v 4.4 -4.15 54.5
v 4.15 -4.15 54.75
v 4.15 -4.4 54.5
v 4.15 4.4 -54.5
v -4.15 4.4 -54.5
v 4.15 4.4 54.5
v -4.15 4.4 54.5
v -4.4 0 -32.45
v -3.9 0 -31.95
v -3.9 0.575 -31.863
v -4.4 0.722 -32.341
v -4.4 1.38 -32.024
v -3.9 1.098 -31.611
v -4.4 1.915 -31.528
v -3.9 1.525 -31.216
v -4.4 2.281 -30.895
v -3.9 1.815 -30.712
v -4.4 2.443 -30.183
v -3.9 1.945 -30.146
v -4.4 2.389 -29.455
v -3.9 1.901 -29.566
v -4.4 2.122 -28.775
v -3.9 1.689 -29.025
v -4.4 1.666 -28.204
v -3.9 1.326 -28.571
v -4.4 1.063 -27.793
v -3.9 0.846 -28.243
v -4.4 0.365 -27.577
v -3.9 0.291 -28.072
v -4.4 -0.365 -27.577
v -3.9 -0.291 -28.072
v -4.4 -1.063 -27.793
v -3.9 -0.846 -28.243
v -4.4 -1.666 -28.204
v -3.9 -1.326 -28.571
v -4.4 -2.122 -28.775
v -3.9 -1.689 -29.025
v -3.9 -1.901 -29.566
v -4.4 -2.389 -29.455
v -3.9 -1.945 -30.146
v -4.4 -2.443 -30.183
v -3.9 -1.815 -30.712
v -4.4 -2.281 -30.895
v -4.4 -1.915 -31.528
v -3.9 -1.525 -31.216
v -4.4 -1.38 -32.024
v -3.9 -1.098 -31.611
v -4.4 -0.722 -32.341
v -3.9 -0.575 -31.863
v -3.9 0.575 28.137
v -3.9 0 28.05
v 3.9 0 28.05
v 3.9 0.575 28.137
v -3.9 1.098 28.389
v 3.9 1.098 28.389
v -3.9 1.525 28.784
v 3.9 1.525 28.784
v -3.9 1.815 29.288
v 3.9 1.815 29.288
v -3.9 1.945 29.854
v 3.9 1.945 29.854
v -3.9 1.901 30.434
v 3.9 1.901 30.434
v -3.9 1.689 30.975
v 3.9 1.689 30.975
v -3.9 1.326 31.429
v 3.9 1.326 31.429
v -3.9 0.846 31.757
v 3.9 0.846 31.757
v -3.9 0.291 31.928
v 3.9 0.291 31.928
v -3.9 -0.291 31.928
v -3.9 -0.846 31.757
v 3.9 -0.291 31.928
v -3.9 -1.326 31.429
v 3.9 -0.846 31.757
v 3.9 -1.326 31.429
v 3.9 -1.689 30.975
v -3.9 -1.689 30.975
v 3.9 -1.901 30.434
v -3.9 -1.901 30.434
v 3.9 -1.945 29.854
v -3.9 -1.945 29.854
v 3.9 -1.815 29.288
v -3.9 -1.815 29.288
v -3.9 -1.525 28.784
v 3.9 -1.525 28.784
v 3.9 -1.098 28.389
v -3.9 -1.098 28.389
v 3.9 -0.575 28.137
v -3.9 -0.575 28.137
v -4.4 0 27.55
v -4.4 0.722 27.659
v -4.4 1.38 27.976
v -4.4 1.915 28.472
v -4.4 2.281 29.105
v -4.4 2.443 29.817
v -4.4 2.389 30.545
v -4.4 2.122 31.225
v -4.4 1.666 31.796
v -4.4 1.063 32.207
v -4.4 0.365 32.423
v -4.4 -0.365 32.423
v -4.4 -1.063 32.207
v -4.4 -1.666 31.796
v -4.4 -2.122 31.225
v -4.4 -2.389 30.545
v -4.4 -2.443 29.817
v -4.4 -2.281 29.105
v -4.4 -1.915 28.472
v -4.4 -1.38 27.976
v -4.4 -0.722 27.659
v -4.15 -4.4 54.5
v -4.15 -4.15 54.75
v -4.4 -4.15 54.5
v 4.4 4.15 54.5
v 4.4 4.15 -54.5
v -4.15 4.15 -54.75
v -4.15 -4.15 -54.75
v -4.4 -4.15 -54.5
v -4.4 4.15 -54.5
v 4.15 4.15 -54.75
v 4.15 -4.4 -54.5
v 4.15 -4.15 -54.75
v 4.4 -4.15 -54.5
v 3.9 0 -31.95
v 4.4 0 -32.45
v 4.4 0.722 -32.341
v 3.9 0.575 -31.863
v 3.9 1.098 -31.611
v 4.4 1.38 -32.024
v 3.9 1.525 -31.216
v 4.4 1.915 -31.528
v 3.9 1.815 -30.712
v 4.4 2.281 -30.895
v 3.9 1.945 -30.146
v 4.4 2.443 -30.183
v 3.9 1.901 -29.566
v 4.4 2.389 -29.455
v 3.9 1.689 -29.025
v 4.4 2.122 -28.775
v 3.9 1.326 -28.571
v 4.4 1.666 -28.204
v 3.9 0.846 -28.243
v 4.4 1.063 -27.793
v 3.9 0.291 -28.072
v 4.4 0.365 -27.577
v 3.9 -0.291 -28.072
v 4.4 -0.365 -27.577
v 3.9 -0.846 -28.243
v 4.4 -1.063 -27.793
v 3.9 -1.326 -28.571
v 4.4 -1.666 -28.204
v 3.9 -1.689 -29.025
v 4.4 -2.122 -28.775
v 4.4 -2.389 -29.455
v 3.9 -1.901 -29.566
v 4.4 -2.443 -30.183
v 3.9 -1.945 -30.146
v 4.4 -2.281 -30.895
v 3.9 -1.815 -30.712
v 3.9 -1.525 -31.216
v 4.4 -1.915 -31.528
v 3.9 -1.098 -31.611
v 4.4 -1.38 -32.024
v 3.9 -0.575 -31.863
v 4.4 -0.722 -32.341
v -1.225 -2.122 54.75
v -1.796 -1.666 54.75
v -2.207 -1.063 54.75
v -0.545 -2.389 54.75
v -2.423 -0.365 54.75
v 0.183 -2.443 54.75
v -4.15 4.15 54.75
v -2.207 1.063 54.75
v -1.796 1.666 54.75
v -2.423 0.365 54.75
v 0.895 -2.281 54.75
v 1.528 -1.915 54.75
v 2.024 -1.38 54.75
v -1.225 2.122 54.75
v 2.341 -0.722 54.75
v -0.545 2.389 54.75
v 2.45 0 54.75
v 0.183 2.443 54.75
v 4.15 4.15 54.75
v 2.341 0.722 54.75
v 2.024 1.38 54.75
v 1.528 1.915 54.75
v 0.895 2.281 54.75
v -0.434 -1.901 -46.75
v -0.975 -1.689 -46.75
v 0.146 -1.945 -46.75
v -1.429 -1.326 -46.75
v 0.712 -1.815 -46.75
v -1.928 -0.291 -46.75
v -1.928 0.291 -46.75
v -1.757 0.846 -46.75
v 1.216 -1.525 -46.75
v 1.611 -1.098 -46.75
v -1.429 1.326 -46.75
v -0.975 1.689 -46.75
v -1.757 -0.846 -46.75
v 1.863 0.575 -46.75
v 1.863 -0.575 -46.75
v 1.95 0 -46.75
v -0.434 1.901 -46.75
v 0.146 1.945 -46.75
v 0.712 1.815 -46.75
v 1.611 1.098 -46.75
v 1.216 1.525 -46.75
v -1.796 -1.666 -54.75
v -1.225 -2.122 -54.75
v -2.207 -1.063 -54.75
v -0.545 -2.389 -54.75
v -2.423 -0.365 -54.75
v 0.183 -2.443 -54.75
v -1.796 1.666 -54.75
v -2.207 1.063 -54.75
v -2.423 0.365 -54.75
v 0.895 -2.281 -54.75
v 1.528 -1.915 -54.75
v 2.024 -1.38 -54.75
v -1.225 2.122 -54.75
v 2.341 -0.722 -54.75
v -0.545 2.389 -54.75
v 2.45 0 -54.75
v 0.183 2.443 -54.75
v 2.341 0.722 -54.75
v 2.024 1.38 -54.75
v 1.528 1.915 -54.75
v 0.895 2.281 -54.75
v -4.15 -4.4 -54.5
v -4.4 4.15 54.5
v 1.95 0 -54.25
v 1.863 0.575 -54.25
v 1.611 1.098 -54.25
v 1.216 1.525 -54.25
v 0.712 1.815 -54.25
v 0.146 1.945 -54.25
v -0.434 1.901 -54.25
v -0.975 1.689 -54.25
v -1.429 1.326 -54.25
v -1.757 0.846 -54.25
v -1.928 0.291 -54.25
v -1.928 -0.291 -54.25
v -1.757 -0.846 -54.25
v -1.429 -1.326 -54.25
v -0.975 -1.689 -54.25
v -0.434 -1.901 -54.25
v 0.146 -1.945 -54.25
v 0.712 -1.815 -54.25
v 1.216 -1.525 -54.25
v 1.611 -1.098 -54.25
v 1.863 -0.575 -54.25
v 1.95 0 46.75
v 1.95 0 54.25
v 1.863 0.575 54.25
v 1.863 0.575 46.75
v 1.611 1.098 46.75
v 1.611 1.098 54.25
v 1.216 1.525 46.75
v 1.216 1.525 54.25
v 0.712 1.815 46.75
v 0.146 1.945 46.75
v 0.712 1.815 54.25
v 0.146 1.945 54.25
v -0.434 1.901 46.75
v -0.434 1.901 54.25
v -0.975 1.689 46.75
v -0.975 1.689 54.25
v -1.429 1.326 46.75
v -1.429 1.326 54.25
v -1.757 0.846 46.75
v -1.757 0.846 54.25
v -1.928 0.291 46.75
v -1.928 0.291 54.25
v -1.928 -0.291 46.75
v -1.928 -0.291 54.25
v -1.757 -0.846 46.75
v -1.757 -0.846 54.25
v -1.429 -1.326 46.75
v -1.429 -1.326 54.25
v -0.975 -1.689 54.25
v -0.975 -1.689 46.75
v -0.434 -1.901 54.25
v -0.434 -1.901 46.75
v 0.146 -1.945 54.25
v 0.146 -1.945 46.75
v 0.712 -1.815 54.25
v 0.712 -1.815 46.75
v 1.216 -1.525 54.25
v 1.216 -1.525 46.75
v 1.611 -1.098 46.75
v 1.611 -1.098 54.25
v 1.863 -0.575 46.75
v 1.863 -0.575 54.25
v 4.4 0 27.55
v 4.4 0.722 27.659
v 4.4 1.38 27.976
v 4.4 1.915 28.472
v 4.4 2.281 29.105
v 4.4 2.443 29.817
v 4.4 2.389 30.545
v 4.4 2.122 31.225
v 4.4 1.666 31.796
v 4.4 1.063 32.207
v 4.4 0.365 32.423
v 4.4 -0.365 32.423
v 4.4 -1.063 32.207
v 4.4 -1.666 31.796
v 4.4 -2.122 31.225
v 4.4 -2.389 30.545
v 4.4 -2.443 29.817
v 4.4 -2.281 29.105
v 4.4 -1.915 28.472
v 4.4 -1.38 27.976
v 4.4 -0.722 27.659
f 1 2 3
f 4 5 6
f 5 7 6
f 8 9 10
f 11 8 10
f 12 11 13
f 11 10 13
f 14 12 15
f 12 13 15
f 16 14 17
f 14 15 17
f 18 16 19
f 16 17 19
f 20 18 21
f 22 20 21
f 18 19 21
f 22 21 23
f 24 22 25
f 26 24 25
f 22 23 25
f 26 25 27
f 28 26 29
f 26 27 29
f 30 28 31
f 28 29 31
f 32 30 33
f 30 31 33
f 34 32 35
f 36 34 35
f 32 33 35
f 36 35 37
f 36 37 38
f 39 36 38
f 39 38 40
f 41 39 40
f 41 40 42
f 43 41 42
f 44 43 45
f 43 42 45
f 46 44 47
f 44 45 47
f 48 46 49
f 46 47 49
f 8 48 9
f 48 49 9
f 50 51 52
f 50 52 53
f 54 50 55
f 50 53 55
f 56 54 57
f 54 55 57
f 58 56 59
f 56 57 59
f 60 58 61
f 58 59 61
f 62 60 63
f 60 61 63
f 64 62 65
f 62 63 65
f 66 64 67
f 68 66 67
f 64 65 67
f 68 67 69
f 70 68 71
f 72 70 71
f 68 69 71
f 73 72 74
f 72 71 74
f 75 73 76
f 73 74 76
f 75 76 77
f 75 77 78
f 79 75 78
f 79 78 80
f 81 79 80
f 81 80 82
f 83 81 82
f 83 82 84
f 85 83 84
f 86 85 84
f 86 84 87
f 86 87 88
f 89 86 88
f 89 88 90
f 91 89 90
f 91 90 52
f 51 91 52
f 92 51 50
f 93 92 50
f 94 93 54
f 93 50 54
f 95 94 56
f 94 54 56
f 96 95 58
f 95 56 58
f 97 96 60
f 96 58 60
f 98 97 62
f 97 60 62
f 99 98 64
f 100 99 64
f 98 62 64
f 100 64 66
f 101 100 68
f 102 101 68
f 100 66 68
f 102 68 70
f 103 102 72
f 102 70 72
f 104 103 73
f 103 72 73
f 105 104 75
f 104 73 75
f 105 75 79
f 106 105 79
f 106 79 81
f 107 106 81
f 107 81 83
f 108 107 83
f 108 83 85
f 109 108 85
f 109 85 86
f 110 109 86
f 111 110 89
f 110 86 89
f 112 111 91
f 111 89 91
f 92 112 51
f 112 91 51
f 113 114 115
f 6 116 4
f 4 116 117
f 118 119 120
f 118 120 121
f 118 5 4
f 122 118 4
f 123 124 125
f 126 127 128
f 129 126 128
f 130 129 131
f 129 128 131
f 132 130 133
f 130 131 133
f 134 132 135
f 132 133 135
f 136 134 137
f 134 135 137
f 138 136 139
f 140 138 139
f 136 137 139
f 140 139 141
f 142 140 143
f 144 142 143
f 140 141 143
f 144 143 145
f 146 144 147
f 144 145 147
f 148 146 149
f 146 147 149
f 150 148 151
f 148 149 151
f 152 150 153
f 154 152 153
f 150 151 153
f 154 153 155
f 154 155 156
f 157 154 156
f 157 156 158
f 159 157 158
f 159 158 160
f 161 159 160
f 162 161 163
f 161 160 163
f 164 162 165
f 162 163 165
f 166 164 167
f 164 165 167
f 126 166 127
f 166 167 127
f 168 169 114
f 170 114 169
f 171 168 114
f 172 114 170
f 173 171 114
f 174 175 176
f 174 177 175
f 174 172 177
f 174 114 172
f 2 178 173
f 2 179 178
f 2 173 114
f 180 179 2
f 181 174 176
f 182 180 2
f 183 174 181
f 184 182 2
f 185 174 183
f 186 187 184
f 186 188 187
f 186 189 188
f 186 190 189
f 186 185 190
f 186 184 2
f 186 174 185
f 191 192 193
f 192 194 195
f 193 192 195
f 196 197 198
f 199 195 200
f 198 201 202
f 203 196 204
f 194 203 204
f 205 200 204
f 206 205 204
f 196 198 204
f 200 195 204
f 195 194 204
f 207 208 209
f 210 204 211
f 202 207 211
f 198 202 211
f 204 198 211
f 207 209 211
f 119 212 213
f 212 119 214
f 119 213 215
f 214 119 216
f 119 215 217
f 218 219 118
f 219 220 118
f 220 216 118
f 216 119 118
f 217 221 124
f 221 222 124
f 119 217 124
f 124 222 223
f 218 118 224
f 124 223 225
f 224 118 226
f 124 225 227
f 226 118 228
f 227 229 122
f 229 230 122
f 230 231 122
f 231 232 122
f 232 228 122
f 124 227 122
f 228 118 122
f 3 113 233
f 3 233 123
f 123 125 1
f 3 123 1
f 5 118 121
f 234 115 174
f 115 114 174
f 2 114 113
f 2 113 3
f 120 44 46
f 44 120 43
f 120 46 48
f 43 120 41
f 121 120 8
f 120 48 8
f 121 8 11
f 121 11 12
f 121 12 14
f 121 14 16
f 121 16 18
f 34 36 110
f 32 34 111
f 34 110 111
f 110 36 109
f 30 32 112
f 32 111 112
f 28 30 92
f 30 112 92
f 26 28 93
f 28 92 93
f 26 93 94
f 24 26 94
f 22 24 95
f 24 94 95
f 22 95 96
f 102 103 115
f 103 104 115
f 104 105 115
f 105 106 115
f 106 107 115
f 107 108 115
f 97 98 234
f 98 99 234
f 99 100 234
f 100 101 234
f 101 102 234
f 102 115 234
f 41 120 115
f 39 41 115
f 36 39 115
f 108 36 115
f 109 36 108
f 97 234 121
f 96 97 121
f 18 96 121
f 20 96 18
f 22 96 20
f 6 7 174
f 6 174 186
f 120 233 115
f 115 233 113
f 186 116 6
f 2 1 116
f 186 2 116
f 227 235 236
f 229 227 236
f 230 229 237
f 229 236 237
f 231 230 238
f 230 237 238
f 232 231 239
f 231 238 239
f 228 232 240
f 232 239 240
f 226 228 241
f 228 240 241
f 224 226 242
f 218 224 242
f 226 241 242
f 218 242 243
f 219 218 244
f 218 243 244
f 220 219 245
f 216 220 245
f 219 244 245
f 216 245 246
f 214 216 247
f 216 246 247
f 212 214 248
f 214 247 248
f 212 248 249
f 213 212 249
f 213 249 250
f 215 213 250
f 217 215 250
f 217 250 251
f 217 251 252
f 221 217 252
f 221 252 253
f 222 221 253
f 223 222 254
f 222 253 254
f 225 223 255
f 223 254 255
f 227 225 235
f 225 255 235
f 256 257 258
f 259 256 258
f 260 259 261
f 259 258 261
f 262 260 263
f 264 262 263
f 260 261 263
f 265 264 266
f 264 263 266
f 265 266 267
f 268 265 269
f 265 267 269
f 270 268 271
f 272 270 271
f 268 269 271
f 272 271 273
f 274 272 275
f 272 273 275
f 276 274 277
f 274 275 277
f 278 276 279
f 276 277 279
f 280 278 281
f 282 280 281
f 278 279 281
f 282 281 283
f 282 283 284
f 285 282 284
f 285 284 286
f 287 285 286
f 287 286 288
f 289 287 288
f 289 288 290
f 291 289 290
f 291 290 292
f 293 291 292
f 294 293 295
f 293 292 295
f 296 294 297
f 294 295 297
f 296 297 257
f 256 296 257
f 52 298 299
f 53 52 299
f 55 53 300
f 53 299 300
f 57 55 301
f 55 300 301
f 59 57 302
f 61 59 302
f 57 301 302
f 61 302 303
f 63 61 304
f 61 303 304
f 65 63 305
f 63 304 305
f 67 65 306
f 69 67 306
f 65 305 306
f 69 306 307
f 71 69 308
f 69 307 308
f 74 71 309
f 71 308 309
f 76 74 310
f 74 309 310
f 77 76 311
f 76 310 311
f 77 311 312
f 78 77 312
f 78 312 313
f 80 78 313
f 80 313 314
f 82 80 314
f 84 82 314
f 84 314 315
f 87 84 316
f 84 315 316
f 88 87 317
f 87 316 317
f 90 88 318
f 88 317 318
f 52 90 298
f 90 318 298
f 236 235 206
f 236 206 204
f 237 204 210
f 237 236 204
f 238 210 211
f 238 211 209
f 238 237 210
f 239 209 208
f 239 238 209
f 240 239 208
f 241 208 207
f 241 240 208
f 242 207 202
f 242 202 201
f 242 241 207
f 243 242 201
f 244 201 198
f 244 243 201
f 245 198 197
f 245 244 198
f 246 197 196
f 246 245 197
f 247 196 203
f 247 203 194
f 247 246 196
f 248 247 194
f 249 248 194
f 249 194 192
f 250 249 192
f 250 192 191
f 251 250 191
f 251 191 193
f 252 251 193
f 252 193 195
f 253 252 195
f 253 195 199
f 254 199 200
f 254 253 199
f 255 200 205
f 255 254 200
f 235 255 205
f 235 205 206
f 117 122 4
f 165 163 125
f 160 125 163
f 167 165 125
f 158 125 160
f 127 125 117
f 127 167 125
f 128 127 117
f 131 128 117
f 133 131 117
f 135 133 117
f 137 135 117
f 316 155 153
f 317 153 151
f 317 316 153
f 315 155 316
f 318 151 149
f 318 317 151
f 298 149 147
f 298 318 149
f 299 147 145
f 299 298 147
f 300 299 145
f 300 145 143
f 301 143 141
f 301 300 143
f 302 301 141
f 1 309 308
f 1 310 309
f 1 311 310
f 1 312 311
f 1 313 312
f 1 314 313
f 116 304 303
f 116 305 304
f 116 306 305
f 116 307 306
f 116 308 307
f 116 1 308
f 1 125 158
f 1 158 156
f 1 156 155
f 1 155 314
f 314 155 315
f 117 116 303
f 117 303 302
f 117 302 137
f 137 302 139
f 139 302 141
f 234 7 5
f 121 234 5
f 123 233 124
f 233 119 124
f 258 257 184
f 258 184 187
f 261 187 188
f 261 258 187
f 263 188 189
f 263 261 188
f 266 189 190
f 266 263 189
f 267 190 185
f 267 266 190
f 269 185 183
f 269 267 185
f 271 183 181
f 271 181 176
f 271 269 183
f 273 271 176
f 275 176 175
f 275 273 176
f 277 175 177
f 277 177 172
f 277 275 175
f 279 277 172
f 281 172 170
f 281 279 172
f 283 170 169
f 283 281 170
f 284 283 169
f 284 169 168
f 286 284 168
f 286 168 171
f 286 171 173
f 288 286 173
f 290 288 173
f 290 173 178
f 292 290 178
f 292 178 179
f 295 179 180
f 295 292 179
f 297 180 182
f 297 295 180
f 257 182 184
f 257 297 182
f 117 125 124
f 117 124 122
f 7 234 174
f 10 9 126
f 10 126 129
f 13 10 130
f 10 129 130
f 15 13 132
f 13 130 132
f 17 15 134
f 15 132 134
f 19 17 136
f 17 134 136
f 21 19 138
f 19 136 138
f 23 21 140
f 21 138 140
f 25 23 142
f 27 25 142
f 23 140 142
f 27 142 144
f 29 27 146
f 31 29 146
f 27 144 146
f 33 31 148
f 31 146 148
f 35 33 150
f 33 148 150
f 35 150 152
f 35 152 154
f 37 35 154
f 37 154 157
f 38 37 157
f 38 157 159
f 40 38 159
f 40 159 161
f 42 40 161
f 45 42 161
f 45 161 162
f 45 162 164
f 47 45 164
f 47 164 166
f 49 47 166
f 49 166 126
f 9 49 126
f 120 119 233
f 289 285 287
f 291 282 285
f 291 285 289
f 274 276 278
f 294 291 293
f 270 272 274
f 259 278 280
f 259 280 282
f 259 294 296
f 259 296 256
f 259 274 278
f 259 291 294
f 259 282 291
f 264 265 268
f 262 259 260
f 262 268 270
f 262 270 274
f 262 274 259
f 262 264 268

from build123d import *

# Parameters (mm, degrees)
SKETCH1_W           = 8.8
SKETCH1_H           = 8.8
BOSS_EXTRUDE1_DEPTH = 54.75
SKETCH2_R           = 1.95
CUT_EXTRUDE1_DEPTH  = 8
CUT_EXTRUDE2_REACH  = 57.627
SKETCH3_R           = 1.95
CHAMFER1_SIZE       = 0.5
CHAMFER2_SIZE       = 0.25


with BuildPart() as part:
    # Sketch1 → Boss-Extrude1 (new, symmetric)
    with BuildSketch(Plane.XY):
        Rectangle(SKETCH1_W, SKETCH1_H)
    extrude(amount=BOSS_EXTRUDE1_DEPTH, both=True)

    # Sketch2 → Cut-Extrude1 (cut)
    with BuildSketch(Plane.XY.offset(54.75)):
        Circle(SKETCH2_R)
    cut_extrude1 = extrude(amount=-CUT_EXTRUDE1_DEPTH, mode=Mode.SUBTRACT)

    # Mirror1: Cut-Extrude1 across plane
    add(cut_extrude1.mirror(Plane.XY), mode=Mode.SUBTRACT)

    # Sketch3 → Cut-Extrude2 (cut, up to next)
    with BuildSketch(Plane(origin=(4.4, 0, 0), x_dir=(0, 0, -1), z_dir=(1, 0, 0)), mode=Mode.PRIVATE) as cut_extrude2_sk1:
        with Locations((-30, 0)):
            Circle(SKETCH3_R)
    cut_extrude2_tool1 = extrude(cut_extrude2_sk1.sketch, amount=-CUT_EXTRUDE2_REACH, mode=Mode.PRIVATE) & part.part
    # Sketch3 → Cut-Extrude2 (cut, up to next)
    with BuildSketch(Plane(origin=(4.4, 0, 0), x_dir=(0, 0, -1), z_dir=(1, 0, 0)), mode=Mode.PRIVATE) as cut_extrude2_sk2:
        with Locations((30, 0)):
            Circle(SKETCH3_R)
    cut_extrude2_tool2 = extrude(cut_extrude2_sk2.sketch, amount=-CUT_EXTRUDE2_REACH, mode=Mode.PRIVATE) & part.part
    add(cut_extrude2_tool1.solids().sort_by_distance((4.4, 0, 30))[0], mode=Mode.SUBTRACT)
    add(cut_extrude2_tool2.solids().sort_by_distance((4.4, 0, -30))[0], mode=Mode.SUBTRACT)

    # Chamfer1
    chamfer1_edges = [part.edges().sort_by_distance(p)[0] for p in [
        (-1.95, 0, 54.75),
        (-1.95, 0, -54.75),
        (4.4, 0, 31.95),
        (-4.4, 0, 31.95),
        (4.4, 0, -28.05),
        (-4.4, 0, -28.05),
    ]]
    chamfer(chamfer1_edges, length=CHAMFER1_SIZE)

    # Chamfer2
    chamfer2_edges = [part.edges().sort_by_distance(p)[0] for p in [
        (-4.4, 0, 54.75),
        (0, -4.4, 54.75),
        (4.4, 0, 54.75),
        (0, -4.4, -54.75),
        (-4.4, 0, -54.75),
        (0, 4.4, -54.75),
        (4.4, 0, -54.75),
        (4.4, -4.4, 0),
        (-4.4, -4.4, 0),
        (-4.4, 4.4, 0),
        (4.4, 4.4, 0),
        (0, 4.4, 54.75),
    ]]
    chamfer(chamfer2_edges, length=CHAMFER2_SIZE)


solid = part.part
